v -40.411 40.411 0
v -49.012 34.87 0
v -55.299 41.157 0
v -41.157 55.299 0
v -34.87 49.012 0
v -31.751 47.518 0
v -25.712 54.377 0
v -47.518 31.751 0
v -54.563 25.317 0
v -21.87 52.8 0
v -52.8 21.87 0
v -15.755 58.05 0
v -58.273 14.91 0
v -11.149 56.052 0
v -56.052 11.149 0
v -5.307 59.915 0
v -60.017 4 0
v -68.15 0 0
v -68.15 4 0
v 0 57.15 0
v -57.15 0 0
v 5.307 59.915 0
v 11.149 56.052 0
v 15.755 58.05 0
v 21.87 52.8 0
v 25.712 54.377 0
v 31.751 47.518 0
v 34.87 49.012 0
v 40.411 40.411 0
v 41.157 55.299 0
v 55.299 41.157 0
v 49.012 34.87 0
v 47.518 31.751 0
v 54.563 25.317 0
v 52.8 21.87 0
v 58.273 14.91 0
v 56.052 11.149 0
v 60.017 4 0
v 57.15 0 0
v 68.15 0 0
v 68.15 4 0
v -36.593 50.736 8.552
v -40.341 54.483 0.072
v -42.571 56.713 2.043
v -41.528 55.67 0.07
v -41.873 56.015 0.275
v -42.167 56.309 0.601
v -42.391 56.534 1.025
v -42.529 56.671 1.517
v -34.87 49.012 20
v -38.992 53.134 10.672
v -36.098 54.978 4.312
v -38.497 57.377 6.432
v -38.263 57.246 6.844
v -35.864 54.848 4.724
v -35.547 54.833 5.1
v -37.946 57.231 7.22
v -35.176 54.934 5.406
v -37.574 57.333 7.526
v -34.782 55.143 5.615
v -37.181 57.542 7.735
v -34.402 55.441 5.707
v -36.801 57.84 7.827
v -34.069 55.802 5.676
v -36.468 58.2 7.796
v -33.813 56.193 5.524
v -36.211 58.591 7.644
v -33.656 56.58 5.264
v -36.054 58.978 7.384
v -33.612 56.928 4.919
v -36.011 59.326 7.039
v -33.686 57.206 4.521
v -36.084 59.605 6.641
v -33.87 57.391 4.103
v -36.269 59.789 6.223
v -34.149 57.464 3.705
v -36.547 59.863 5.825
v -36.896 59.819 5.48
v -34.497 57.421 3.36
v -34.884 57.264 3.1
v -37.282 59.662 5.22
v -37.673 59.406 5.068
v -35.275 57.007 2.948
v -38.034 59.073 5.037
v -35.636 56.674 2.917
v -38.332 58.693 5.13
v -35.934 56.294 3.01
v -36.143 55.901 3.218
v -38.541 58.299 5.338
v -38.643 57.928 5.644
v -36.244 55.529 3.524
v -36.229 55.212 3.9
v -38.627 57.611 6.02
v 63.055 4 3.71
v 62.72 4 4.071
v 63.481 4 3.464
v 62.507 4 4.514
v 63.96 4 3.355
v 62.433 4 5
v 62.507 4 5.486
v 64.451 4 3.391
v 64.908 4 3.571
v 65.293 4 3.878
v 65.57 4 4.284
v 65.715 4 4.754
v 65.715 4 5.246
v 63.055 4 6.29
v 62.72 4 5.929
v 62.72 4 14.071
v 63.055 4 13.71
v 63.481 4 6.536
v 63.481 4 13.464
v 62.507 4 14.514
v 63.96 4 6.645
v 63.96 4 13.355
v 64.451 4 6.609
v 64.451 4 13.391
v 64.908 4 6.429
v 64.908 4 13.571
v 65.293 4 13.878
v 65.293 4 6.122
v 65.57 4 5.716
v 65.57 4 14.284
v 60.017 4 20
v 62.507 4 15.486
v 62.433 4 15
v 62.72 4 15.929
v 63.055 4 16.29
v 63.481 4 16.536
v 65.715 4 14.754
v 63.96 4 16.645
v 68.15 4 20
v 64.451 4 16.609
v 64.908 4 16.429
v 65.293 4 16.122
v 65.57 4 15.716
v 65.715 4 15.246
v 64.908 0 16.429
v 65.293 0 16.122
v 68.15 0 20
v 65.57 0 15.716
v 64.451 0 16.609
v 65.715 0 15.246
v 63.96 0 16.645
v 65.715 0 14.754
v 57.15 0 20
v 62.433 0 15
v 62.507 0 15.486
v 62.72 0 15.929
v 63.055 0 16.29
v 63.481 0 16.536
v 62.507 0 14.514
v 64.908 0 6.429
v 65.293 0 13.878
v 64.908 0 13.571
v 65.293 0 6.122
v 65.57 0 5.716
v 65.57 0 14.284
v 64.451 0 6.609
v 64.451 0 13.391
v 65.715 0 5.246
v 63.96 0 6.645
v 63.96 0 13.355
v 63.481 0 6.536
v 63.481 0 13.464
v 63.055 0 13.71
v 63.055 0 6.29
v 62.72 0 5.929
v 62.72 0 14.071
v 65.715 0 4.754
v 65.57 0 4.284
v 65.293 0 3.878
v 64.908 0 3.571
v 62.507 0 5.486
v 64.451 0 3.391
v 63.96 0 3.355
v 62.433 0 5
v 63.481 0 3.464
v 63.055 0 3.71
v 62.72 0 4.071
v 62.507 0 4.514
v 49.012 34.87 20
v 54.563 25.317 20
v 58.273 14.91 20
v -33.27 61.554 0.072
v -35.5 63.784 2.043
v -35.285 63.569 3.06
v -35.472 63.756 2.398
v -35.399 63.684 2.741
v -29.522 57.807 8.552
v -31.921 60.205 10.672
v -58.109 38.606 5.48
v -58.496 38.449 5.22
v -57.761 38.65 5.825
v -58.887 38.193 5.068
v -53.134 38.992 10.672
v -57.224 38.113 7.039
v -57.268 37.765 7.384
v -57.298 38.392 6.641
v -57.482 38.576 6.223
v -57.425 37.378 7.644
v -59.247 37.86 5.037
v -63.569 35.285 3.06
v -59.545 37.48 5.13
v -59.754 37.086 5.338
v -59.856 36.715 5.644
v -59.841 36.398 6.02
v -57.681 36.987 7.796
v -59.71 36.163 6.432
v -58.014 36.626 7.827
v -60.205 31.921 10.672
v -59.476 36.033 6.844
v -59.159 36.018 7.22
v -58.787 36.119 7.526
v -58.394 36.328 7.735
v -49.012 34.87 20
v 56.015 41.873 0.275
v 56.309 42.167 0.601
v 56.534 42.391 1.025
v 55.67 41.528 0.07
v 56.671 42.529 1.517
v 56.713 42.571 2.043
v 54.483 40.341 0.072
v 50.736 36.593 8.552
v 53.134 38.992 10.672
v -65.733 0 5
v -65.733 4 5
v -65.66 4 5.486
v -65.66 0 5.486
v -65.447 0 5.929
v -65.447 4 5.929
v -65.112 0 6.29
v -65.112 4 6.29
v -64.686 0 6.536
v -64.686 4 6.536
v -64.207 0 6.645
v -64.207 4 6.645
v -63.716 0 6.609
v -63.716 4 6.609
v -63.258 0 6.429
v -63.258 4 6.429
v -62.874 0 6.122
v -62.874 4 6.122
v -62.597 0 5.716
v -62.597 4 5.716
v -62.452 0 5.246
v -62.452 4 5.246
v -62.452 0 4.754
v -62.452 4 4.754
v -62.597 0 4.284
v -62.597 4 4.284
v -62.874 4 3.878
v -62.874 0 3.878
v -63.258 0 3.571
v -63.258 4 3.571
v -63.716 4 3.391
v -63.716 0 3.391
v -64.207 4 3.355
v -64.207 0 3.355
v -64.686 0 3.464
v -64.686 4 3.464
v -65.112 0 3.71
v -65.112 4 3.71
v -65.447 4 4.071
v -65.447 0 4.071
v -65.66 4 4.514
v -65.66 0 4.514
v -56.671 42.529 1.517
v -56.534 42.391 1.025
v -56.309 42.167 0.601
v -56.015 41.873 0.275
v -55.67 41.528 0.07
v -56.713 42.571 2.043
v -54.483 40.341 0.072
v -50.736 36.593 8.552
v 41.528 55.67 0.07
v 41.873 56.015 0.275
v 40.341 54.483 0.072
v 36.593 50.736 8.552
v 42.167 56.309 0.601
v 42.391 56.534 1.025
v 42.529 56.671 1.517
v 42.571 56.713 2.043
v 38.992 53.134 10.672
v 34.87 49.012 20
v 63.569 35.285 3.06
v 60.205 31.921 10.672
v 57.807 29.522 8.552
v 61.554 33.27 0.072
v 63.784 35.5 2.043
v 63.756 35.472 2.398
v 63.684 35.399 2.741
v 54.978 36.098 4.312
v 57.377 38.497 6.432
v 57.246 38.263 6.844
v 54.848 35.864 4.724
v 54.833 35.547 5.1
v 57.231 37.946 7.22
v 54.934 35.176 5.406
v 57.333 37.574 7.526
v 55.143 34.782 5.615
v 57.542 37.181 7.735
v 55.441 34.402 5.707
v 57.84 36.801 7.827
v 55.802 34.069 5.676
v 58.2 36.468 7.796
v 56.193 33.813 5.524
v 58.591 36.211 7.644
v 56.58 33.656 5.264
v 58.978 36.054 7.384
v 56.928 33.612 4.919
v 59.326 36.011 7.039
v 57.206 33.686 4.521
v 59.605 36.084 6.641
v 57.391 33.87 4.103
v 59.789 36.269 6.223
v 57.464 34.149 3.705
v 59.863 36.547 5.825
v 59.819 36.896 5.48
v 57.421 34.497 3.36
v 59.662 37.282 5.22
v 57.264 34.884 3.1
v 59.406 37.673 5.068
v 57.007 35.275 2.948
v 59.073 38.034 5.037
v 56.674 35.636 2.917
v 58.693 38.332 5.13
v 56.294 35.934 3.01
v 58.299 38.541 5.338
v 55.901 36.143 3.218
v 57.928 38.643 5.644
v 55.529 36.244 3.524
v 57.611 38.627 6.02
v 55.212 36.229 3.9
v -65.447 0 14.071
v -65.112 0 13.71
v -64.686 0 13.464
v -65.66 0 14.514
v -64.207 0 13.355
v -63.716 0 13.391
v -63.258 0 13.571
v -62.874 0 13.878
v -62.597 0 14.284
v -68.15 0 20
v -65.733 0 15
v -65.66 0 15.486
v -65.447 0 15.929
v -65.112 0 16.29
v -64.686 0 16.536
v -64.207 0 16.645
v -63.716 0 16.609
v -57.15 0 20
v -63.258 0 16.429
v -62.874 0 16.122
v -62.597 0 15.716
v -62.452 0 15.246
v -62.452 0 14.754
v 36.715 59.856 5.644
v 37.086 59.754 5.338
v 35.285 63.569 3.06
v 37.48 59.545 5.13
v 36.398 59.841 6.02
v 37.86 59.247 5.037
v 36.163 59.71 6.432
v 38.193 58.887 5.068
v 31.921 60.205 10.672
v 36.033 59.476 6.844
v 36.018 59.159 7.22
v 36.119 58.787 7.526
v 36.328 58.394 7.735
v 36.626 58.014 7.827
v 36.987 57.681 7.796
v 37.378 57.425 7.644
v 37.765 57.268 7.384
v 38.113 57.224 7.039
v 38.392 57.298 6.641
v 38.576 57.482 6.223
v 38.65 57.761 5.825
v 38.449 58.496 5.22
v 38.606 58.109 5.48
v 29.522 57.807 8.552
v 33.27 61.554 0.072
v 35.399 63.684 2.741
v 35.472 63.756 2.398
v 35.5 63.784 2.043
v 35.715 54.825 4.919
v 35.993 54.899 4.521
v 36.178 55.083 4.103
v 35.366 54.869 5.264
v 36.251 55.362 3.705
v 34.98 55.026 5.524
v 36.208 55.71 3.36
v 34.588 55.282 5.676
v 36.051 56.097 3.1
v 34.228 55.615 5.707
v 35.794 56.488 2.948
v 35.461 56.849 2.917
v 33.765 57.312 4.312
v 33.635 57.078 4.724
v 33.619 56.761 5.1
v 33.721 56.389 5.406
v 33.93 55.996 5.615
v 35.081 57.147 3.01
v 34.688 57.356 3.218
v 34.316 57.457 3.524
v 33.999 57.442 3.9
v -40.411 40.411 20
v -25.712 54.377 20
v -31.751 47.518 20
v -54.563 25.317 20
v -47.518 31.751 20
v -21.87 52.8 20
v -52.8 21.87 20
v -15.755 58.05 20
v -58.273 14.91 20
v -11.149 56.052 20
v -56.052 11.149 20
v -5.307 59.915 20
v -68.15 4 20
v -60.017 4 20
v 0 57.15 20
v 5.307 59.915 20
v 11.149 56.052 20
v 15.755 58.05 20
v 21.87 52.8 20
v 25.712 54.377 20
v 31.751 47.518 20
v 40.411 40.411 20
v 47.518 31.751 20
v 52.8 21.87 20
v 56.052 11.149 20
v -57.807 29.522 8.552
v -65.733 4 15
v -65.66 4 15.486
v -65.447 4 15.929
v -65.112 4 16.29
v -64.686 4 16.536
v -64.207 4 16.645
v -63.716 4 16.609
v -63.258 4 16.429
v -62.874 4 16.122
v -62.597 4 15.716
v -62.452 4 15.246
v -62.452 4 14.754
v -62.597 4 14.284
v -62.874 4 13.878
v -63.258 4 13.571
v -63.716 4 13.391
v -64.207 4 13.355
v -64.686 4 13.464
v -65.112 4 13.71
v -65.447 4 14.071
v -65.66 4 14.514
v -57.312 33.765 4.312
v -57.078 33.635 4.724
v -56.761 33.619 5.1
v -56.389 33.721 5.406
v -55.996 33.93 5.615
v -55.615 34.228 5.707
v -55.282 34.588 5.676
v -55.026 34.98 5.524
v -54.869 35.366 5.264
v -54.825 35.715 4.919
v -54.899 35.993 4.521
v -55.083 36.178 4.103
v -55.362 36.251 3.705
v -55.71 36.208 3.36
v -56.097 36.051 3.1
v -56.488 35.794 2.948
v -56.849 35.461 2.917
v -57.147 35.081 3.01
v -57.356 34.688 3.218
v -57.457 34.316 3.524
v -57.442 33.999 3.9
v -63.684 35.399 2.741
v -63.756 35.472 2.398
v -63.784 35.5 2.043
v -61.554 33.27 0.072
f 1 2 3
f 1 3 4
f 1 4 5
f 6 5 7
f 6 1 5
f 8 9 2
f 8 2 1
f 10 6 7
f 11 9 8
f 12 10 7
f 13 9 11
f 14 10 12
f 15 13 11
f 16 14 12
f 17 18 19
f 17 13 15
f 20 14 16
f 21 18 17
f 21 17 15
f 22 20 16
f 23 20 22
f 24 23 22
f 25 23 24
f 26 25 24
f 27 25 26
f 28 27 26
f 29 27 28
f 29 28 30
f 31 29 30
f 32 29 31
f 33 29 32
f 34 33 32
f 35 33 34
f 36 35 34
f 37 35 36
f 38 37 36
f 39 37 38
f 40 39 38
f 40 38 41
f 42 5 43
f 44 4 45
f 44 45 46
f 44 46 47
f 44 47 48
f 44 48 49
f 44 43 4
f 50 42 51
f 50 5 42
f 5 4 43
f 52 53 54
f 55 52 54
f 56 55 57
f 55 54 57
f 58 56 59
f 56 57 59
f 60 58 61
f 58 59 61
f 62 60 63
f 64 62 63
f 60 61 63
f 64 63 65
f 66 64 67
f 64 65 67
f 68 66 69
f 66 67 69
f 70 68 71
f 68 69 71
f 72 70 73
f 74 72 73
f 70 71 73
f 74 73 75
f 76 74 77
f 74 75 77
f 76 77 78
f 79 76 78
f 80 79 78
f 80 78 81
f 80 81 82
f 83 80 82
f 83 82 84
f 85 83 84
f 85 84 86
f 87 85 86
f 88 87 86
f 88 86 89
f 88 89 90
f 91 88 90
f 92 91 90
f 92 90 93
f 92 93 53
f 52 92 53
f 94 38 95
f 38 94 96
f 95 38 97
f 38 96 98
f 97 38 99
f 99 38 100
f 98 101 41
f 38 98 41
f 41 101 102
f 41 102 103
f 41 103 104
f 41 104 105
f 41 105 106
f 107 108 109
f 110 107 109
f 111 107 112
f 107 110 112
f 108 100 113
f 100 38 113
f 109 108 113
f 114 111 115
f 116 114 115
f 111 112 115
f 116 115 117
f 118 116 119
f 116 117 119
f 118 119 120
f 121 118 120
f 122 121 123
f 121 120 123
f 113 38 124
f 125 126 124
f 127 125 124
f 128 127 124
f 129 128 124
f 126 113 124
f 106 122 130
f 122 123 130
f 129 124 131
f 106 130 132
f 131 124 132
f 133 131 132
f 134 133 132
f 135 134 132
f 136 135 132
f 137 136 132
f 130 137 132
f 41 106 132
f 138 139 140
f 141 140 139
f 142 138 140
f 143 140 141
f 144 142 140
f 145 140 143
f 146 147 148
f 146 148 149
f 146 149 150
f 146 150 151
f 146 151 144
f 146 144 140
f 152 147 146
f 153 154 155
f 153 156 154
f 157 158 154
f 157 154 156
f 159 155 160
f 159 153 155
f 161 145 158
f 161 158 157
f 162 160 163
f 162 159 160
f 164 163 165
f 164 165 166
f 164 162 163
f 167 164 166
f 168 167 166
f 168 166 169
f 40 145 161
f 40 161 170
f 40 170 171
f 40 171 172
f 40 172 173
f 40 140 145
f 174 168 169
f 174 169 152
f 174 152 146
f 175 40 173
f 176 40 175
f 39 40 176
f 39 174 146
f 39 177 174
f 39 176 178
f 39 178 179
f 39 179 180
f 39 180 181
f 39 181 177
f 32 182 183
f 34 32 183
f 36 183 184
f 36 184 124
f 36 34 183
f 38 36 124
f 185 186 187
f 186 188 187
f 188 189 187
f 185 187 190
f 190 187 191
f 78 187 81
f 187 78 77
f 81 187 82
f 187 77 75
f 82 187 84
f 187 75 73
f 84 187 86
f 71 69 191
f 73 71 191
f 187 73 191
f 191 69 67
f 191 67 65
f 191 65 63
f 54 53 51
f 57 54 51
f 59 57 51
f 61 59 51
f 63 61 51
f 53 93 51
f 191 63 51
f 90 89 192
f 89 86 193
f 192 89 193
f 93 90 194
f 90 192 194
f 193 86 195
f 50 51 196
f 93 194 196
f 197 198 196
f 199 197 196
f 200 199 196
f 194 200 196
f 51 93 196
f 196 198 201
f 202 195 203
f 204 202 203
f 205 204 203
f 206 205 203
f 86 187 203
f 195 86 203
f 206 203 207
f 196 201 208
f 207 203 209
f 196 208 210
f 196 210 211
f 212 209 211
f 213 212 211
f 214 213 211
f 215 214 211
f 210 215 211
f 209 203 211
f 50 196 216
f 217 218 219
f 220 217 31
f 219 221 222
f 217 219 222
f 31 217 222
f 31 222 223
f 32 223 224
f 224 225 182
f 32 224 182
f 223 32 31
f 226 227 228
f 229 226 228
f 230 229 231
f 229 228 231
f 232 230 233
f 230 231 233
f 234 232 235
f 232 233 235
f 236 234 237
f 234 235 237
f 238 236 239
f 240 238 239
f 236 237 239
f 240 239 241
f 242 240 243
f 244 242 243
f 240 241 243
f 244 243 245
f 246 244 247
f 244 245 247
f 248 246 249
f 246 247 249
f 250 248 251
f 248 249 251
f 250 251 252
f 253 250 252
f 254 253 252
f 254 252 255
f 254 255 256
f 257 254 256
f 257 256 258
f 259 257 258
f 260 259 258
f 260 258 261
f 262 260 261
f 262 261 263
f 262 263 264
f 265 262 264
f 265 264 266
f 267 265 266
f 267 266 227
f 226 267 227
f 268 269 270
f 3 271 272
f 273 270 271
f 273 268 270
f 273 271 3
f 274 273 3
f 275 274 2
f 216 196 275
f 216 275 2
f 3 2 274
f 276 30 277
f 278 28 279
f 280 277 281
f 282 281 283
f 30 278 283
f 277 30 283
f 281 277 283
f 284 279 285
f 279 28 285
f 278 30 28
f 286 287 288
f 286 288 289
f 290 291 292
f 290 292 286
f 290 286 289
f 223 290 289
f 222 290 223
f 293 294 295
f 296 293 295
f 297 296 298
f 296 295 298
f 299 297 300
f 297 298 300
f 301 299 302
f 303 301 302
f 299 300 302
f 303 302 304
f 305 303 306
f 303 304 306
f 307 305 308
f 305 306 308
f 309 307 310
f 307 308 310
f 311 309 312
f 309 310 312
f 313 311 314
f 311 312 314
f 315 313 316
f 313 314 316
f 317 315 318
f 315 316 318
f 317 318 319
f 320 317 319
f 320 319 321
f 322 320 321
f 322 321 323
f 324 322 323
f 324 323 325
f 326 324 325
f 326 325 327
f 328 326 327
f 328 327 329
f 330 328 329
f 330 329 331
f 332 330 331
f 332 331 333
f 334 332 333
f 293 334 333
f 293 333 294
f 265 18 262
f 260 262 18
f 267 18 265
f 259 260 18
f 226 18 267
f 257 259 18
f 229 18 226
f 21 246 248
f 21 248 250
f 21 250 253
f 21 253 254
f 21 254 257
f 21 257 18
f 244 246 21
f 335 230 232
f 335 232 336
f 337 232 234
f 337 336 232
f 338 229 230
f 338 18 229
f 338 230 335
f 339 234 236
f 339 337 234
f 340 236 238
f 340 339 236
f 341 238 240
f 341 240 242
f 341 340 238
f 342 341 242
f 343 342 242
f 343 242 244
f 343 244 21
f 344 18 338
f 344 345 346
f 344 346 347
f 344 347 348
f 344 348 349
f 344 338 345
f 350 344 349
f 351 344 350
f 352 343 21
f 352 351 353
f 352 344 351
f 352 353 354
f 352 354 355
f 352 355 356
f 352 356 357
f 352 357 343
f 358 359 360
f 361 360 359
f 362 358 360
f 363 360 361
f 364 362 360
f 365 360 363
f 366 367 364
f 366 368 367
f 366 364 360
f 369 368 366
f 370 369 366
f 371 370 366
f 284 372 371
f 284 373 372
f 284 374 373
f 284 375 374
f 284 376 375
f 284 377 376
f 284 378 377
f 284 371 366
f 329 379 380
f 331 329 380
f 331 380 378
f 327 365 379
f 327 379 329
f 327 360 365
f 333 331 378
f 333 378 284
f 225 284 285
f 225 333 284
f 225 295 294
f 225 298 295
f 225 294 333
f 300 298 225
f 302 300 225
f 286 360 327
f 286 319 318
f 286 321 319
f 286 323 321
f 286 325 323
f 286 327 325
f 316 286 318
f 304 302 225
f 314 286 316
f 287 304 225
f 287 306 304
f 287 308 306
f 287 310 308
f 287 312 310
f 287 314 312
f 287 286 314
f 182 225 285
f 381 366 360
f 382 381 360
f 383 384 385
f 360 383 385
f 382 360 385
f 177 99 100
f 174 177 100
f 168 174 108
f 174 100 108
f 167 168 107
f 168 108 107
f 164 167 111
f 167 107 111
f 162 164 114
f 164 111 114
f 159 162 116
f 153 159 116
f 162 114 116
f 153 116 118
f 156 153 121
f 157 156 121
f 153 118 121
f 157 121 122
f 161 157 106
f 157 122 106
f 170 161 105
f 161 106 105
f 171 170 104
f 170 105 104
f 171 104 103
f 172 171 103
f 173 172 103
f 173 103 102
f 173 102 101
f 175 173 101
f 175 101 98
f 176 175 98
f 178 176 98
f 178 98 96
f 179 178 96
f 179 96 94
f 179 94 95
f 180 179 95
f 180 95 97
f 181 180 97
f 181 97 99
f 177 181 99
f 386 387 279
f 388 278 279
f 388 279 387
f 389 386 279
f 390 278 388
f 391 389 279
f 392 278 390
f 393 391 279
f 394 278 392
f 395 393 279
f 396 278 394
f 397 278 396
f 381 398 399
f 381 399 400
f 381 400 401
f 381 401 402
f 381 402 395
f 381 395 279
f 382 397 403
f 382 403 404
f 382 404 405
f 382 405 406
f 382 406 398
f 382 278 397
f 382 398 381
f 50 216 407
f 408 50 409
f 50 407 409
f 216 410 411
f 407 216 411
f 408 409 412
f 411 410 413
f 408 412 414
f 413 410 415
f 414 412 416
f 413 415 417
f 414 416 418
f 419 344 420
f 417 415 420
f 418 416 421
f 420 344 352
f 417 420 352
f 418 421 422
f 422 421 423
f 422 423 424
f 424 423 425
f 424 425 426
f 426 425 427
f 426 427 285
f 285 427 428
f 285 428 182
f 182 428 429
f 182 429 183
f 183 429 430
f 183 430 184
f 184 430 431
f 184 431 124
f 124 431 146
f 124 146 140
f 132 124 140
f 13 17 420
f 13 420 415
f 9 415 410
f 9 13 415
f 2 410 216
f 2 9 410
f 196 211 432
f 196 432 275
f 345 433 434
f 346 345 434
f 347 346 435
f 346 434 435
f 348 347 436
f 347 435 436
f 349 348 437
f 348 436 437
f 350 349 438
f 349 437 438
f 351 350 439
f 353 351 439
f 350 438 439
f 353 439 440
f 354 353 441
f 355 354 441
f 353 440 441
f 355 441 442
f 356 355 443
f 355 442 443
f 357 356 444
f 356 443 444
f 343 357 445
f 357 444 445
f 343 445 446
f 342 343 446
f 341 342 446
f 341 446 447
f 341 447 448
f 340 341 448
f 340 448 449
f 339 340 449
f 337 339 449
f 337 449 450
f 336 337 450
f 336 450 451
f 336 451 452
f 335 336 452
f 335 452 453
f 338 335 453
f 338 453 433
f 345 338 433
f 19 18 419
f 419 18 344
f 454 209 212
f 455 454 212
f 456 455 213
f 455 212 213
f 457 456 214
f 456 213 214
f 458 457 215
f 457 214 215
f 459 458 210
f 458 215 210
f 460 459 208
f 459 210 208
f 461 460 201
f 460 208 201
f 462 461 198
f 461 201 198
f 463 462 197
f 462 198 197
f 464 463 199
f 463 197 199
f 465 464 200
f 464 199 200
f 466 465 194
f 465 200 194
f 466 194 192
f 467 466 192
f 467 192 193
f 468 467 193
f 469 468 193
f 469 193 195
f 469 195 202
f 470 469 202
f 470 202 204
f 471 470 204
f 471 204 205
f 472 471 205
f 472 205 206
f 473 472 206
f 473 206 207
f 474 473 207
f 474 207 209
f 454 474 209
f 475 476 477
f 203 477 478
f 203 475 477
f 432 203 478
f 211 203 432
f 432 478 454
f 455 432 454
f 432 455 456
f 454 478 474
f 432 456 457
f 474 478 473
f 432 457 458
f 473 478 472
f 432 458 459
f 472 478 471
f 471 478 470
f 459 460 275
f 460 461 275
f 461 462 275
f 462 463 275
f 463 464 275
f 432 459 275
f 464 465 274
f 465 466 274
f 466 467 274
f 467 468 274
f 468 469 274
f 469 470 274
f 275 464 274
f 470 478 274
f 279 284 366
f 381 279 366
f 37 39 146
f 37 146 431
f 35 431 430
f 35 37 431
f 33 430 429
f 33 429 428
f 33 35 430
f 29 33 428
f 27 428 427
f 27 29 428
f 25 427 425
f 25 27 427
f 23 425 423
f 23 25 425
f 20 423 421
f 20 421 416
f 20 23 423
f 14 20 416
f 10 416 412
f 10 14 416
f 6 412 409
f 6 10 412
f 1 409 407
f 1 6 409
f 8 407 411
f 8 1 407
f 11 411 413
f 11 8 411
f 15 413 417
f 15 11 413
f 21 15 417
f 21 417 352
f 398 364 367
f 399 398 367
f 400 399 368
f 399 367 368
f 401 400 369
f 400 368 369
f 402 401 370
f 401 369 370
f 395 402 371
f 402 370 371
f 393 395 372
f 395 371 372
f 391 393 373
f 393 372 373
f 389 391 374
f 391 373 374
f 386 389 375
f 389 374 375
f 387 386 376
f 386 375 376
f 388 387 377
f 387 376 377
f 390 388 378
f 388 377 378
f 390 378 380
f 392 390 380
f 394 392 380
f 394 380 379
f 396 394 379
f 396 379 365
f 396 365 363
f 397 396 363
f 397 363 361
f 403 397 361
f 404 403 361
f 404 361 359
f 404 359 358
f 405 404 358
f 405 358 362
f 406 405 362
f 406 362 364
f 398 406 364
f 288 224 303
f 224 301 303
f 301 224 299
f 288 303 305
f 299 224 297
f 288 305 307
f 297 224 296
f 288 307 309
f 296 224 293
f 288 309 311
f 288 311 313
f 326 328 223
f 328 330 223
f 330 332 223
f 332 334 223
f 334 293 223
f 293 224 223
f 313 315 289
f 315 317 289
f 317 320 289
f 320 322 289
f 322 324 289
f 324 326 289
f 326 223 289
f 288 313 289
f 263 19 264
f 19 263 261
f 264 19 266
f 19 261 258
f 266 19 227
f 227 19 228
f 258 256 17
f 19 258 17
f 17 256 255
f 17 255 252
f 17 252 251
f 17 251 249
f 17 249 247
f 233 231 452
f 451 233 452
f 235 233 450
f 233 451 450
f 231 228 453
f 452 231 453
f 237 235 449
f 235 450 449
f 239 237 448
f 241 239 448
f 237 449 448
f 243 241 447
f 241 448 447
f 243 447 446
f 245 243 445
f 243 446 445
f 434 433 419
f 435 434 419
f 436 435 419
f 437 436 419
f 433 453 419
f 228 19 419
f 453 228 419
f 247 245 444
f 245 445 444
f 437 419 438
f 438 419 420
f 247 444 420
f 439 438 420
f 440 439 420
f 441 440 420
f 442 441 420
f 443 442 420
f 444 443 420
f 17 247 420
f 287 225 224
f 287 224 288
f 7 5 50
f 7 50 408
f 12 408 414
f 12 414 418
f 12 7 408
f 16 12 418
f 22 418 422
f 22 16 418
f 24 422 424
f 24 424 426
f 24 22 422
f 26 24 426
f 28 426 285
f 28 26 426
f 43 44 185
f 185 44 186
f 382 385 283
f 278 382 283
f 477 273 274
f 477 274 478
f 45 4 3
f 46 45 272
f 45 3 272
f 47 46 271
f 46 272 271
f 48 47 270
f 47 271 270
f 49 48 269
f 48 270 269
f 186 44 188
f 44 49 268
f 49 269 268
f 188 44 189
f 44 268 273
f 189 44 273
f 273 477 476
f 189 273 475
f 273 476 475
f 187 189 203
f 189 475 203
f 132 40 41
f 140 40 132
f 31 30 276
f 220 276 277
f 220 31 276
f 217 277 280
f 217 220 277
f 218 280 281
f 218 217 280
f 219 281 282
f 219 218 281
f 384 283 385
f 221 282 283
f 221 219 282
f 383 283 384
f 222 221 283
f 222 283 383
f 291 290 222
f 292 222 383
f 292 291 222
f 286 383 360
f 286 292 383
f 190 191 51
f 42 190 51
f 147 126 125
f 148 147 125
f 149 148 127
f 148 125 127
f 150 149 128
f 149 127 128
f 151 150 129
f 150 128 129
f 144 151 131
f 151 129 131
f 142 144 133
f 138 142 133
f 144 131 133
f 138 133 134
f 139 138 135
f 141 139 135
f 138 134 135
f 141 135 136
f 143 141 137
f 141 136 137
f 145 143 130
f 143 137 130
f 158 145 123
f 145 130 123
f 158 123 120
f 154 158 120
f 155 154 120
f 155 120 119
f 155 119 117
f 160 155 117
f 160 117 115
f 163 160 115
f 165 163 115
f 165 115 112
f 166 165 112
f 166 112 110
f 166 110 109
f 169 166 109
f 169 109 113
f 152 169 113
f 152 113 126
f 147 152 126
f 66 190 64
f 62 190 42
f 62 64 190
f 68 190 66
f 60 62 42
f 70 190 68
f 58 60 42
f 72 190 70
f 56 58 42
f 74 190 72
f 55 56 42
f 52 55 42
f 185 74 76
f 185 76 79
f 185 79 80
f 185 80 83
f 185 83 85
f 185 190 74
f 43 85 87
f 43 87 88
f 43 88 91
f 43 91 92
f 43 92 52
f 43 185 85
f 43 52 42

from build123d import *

# Parameters (mm, degrees)
EXTRUDE_1_DEPTH     = 20
EXTRUDE_2_DEPTH     = 20
CUT_EXTRUDE_1_REACH = 99.146
CUT_EXTRUDE_2_REACH = 99.146
EXTRUDE_3_DEPTH     = 4
EXTRUDE_4_DEPTH     = 4
CUT_EXTRUDE_3_REACH = 113.665
SKETCH_8_R          = 1.65
FILLET_1_R          = 2
CUT_EXTRUDE_4_REACH = 113.513
SKETCH_9_R          = 1.65
SKETCH_10_W         = 10
SKETCH_10_H         = 20
EXTRUDE_5_DEPTH     = 4
CUT_EXTRUDE_5_REACH = 94.836
SKETCH_11_R         = 1.65


with BuildPart() as part:
    # ｽｹｯﾁ1 → ﾎﾞｽ - 押し出し1 (new body)
    with BuildSketch(Plane.XY):
        with BuildLine():
            Line((-57.15, 0), (-60.15, 0))
            ThreePointArc((-60.15, 0), (0, 60.15), (60.15, 0))
            Line((60.15, 0), (57.15, 0))
            ThreePointArc((57.15, 0), (0, 57.15), (-57.15, 0))
        make_face()
    extrude(amount=EXTRUDE_1_DEPTH)

    # ｽｹｯﾁ3 → ﾎﾞｽ - 押し出し2 (add)
    with BuildSketch(Plane.XY.offset(20)):
        Polygon((-41.94056807, 41.94056807), (-34.869500258, 49.011635881), (-43.708335023, 57.850470646), (-57.850470646, 43.708335023), (-49.011635881, 34.869500258), align=None)
        Polygon((57.850470646, 43.708335023), (49.011635881, 34.869500258), (41.94056807, 41.94056807), (34.869500258, 49.011635881), (43.708335023, 57.850470646), align=None)
    extrude(amount=-EXTRUDE_2_DEPTH)

    # ｽｹｯﾁ4 → ｶｯﾄ - 押し出し1 (cut, up to next)
    with BuildSketch(Plane(origin=(-7.071067812, -7.071067812, 0), x_dir=(0, 0, 1), z_dir=(-0.7071067811865431, -0.7071067811865519, 0)), mode=Mode.PRIVATE) as cut_extrude_1_sk1:
        Polygon((0, 71.812920178), (20, 59.312920178), (20, 71.812920178), align=None)
    cut_extrude_1_tool1 = extrude(cut_extrude_1_sk1.sketch, amount=-CUT_EXTRUDE_1_REACH, mode=Mode.PRIVATE) & part.part
    add(cut_extrude_1_tool1.solids().sort_by_distance((-54.904192, 40.762057, 13.333333))[0], mode=Mode.SUBTRACT)

    # ｽｹｯﾁ5 → ｶｯﾄ - 押し出し2 (cut, up to next)
    with BuildSketch(Plane(origin=(7.071067812, -7.071067812, 0), x_dir=(0, 0, -1), z_dir=(0.7071067811865431, -0.7071067811865519, 0)), mode=Mode.PRIVATE) as cut_extrude_2_sk1:
        Polygon((0, 71.812920178), (-20, 59.312920178), (-20, 71.812920178), align=None)
    cut_extrude_2_tool1 = extrude(cut_extrude_2_sk1.sketch, amount=-CUT_EXTRUDE_2_REACH, mode=Mode.PRIVATE) & part.part
    add(cut_extrude_2_tool1.solids().sort_by_distance((54.904192, 40.762057, 13.333333))[0], mode=Mode.SUBTRACT)

    # ｽｹｯﾁ6 → ﾎﾞｽ - 押し出し3 (add)
    with BuildSketch(Plane(origin=(-36.515525634, 36.515525634, 32.275469743), x_dir=(0.7991544988642271, 0.4135236263174359, 0.4362915280203637), z_dir=(-0.5996253511966934, 0.5996253511966858, 0.5299989400031792))):
        Polygon((-26.82708742, 25.275306051), (-35.402016678, 20.130348497), (-30.257059123, 11.55541924), (-21.682129866, 16.700376794), align=None)
        Polygon((4.042657905, 32.135249457), (-4.532271352, 26.990291903), (-9.677228906, 35.56522116), (-1.102299649, 40.710178714), align=None)
    extrude(amount=-EXTRUDE_3_DEPTH)

    # ｽｹｯﾁ7 → ﾎﾞｽ - 押し出し4 (add)
    with BuildSketch(Plane(origin=(36.515525634, 36.515525634, 32.275469743), x_dir=(0.7991544988642272, -0.41352362631743567, -0.43629152802036364), z_dir=(0.5996253511966931, 0.5996253511966856, 0.5299989400031795))):
        Polygon((9.677228906, 35.56522116), (4.532271352, 26.990291903), (-4.042657905, 32.135249457), (1.102299649, 40.710178714), align=None)
        Polygon((30.257059123, 11.55541924), (35.402016678, 20.130348497), (26.82708742, 25.275306051), (21.682129866, 16.700376794), align=None)
    extrude(amount=-EXTRUDE_4_DEPTH)

    # ｽｹｯﾁ8 → ｶｯﾄ - 押し出し3 (cut, up to next)
    with BuildSketch(Plane(origin=(36.515525634, 36.515525634, 32.275469743), x_dir=(0.7991544988642272, -0.41352362631743567, -0.43629152802036364), z_dir=(0.5996253511966931, 0.5996253511966856, 0.5299989400031795)), mode=Mode.PRIVATE) as cut_extrude_3_sk1:
        with Locations(Location((2.817285501, 33.850235308, 0), (0, 0, 149.036243468))):
            Circle(SKETCH_8_R)
    cut_extrude_3_tool1 = extrude(cut_extrude_3_sk1.sketch, amount=-CUT_EXTRUDE_3_REACH, mode=Mode.PRIVATE) & part.part
    # ｽｹｯﾁ8 → ｶｯﾄ - 押し出し3 (cut, up to next)
    with BuildSketch(Plane(origin=(36.515525634, 36.515525634, 32.275469743), x_dir=(0.7991544988642272, -0.41352362631743567, -0.43629152802036364), z_dir=(0.5996253511966931, 0.5996253511966856, 0.5299989400031795)), mode=Mode.PRIVATE) as cut_extrude_3_sk2:
        with Locations(Location((28.542073272, 18.415362646, 0), (0, 0, 149.036243468))):
            Circle(SKETCH_8_R)
    cut_extrude_3_tool2 = extrude(cut_extrude_3_sk2.sketch, amount=-CUT_EXTRUDE_3_REACH, mode=Mode.PRIVATE) & part.part
    add(cut_extrude_3_tool1.solids().sort_by_distance((37.33022, 58.543423, 6.432027))[0], mode=Mode.SUBTRACT)
    add(cut_extrude_3_tool2.solids().sort_by_distance((58.543423, 37.33022, 6.432027))[0], mode=Mode.SUBTRACT)

    # ﾌｨﾚｯﾄ1
    fillet_1_edges = [part.edges().sort_by_distance(p)[0] for p in [
        (50.779402834, 50.779402834, 0),
        (-50.779402834, 50.779402834, 0),
    ]]
    fillet(fillet_1_edges, radius=FILLET_1_R)

    # ｽｹｯﾁ9 → ｶｯﾄ - 押し出し4 (cut, up to next)
    with BuildSketch(Plane(origin=(-36.515525634, 36.515525634, 32.275469743), x_dir=(0.7991544988642271, 0.4135236263174359, 0.4362915280203637), z_dir=(-0.5996253511966934, 0.5996253511966858, 0.5299989400031792)), mode=Mode.PRIVATE) as cut_extrude_4_sk1:
        with Locations(Location((-2.817285501, 33.850235308, 0), (0, 0, 210.963756532))):
            Circle(SKETCH_9_R)
    cut_extrude_4_tool1 = extrude(cut_extrude_4_sk1.sketch, amount=-CUT_EXTRUDE_4_REACH, mode=Mode.PRIVATE) & part.part
    # ｽｹｯﾁ9 → ｶｯﾄ - 押し出し4 (cut, up to next)
    with BuildSketch(Plane(origin=(-36.515525634, 36.515525634, 32.275469743), x_dir=(0.7991544988642271, 0.4135236263174359, 0.4362915280203637), z_dir=(-0.5996253511966934, 0.5996253511966858, 0.5299989400031792)), mode=Mode.PRIVATE) as cut_extrude_4_sk2:
        with Locations(Location((-28.542073272, 18.415362646, 0), (0, 0, 210.963756532))):
            Circle(SKETCH_9_R)
    cut_extrude_4_tool2 = extrude(cut_extrude_4_sk2.sketch, amount=-CUT_EXTRUDE_4_REACH, mode=Mode.PRIVATE) & part.part
    add(cut_extrude_4_tool1.solids().sort_by_distance((-37.33022, 58.543423, 6.432027))[0], mode=Mode.SUBTRACT)
    add(cut_extrude_4_tool2.solids().sort_by_distance((-58.543423, 37.33022, 6.432027))[0], mode=Mode.SUBTRACT)

    # ｽｹｯﾁ10 → ﾎﾞｽ - 押し出し5 (add)
    with BuildSketch(Plane.XZ):
        with Locations((-63.15, 10)):
            Rectangle(SKETCH_10_W, SKETCH_10_H)
        with Locations((63.15, 10)):
            Rectangle(SKETCH_10_W, SKETCH_10_H)
    extrude(amount=-EXTRUDE_5_DEPTH)

    # ｽｹｯﾁ11 → ｶｯﾄ - 押し出し5 (cut, up to next)
    with BuildSketch(Plane(origin=(0, 4, 0), x_dir=(1, 0, 0), z_dir=(0, 1, 0)), mode=Mode.PRIVATE) as cut_extrude_5_sk1:
        with Locations(Location((64.0834259, -5, 0), (0, 0, 180))):
            Circle(SKETCH_11_R)
    cut_extrude_5_tool1 = extrude(cut_extrude_5_sk1.sketch, amount=-CUT_EXTRUDE_5_REACH, mode=Mode.PRIVATE) & part.part
    # ｽｹｯﾁ11 → ｶｯﾄ - 押し出し5 (cut, up to next)
    with BuildSketch(Plane(origin=(0, 4, 0), x_dir=(1, 0, 0), z_dir=(0, 1, 0)), mode=Mode.PRIVATE) as cut_extrude_5_sk2:
        with Locations(Location((64.0834259, -15, 0), (0, 0, 180))):
            Circle(SKETCH_11_R)
    cut_extrude_5_tool2 = extrude(cut_extrude_5_sk2.sketch, amount=-CUT_EXTRUDE_5_REACH, mode=Mode.PRIVATE) & part.part
    # ｽｹｯﾁ11 → ｶｯﾄ - 押し出し5 (cut, up to next)
    with BuildSketch(Plane(origin=(0, 4, 0), x_dir=(1, 0, 0), z_dir=(0, 1, 0)), mode=Mode.PRIVATE) as cut_extrude_5_sk3:
        with Locations(Location((-64.0834259, -15, 0), (0, 0, 180))):
            Circle(SKETCH_11_R)
    cut_extrude_5_tool3 = extrude(cut_extrude_5_sk3.sketch, amount=-CUT_EXTRUDE_5_REACH, mode=Mode.PRIVATE) & part.part
    # ｽｹｯﾁ11 → ｶｯﾄ - 押し出し5 (cut, up to next)
    with BuildSketch(Plane(origin=(0, 4, 0), x_dir=(1, 0, 0), z_dir=(0, 1, 0)), mode=Mode.PRIVATE) as cut_extrude_5_sk4:
        with Locations(Location((-64.0834259, -5, 0), (0, 0, 180))):
            Circle(SKETCH_11_R)
    cut_extrude_5_tool4 = extrude(cut_extrude_5_sk4.sketch, amount=-CUT_EXTRUDE_5_REACH, mode=Mode.PRIVATE) & part.part
    add(cut_extrude_5_tool1.solids().sort_by_distance((64.083426, 4, 5))[0], mode=Mode.SUBTRACT)
    add(cut_extrude_5_tool2.solids().sort_by_distance((64.083426, 4, 15))[0], mode=Mode.SUBTRACT)
    add(cut_extrude_5_tool3.solids().sort_by_distance((-64.083426, 4, 15))[0], mode=Mode.SUBTRACT)
    add(cut_extrude_5_tool4.solids().sort_by_distance((-64.083426, 4, 5))[0], mode=Mode.SUBTRACT)


solid = part.part
